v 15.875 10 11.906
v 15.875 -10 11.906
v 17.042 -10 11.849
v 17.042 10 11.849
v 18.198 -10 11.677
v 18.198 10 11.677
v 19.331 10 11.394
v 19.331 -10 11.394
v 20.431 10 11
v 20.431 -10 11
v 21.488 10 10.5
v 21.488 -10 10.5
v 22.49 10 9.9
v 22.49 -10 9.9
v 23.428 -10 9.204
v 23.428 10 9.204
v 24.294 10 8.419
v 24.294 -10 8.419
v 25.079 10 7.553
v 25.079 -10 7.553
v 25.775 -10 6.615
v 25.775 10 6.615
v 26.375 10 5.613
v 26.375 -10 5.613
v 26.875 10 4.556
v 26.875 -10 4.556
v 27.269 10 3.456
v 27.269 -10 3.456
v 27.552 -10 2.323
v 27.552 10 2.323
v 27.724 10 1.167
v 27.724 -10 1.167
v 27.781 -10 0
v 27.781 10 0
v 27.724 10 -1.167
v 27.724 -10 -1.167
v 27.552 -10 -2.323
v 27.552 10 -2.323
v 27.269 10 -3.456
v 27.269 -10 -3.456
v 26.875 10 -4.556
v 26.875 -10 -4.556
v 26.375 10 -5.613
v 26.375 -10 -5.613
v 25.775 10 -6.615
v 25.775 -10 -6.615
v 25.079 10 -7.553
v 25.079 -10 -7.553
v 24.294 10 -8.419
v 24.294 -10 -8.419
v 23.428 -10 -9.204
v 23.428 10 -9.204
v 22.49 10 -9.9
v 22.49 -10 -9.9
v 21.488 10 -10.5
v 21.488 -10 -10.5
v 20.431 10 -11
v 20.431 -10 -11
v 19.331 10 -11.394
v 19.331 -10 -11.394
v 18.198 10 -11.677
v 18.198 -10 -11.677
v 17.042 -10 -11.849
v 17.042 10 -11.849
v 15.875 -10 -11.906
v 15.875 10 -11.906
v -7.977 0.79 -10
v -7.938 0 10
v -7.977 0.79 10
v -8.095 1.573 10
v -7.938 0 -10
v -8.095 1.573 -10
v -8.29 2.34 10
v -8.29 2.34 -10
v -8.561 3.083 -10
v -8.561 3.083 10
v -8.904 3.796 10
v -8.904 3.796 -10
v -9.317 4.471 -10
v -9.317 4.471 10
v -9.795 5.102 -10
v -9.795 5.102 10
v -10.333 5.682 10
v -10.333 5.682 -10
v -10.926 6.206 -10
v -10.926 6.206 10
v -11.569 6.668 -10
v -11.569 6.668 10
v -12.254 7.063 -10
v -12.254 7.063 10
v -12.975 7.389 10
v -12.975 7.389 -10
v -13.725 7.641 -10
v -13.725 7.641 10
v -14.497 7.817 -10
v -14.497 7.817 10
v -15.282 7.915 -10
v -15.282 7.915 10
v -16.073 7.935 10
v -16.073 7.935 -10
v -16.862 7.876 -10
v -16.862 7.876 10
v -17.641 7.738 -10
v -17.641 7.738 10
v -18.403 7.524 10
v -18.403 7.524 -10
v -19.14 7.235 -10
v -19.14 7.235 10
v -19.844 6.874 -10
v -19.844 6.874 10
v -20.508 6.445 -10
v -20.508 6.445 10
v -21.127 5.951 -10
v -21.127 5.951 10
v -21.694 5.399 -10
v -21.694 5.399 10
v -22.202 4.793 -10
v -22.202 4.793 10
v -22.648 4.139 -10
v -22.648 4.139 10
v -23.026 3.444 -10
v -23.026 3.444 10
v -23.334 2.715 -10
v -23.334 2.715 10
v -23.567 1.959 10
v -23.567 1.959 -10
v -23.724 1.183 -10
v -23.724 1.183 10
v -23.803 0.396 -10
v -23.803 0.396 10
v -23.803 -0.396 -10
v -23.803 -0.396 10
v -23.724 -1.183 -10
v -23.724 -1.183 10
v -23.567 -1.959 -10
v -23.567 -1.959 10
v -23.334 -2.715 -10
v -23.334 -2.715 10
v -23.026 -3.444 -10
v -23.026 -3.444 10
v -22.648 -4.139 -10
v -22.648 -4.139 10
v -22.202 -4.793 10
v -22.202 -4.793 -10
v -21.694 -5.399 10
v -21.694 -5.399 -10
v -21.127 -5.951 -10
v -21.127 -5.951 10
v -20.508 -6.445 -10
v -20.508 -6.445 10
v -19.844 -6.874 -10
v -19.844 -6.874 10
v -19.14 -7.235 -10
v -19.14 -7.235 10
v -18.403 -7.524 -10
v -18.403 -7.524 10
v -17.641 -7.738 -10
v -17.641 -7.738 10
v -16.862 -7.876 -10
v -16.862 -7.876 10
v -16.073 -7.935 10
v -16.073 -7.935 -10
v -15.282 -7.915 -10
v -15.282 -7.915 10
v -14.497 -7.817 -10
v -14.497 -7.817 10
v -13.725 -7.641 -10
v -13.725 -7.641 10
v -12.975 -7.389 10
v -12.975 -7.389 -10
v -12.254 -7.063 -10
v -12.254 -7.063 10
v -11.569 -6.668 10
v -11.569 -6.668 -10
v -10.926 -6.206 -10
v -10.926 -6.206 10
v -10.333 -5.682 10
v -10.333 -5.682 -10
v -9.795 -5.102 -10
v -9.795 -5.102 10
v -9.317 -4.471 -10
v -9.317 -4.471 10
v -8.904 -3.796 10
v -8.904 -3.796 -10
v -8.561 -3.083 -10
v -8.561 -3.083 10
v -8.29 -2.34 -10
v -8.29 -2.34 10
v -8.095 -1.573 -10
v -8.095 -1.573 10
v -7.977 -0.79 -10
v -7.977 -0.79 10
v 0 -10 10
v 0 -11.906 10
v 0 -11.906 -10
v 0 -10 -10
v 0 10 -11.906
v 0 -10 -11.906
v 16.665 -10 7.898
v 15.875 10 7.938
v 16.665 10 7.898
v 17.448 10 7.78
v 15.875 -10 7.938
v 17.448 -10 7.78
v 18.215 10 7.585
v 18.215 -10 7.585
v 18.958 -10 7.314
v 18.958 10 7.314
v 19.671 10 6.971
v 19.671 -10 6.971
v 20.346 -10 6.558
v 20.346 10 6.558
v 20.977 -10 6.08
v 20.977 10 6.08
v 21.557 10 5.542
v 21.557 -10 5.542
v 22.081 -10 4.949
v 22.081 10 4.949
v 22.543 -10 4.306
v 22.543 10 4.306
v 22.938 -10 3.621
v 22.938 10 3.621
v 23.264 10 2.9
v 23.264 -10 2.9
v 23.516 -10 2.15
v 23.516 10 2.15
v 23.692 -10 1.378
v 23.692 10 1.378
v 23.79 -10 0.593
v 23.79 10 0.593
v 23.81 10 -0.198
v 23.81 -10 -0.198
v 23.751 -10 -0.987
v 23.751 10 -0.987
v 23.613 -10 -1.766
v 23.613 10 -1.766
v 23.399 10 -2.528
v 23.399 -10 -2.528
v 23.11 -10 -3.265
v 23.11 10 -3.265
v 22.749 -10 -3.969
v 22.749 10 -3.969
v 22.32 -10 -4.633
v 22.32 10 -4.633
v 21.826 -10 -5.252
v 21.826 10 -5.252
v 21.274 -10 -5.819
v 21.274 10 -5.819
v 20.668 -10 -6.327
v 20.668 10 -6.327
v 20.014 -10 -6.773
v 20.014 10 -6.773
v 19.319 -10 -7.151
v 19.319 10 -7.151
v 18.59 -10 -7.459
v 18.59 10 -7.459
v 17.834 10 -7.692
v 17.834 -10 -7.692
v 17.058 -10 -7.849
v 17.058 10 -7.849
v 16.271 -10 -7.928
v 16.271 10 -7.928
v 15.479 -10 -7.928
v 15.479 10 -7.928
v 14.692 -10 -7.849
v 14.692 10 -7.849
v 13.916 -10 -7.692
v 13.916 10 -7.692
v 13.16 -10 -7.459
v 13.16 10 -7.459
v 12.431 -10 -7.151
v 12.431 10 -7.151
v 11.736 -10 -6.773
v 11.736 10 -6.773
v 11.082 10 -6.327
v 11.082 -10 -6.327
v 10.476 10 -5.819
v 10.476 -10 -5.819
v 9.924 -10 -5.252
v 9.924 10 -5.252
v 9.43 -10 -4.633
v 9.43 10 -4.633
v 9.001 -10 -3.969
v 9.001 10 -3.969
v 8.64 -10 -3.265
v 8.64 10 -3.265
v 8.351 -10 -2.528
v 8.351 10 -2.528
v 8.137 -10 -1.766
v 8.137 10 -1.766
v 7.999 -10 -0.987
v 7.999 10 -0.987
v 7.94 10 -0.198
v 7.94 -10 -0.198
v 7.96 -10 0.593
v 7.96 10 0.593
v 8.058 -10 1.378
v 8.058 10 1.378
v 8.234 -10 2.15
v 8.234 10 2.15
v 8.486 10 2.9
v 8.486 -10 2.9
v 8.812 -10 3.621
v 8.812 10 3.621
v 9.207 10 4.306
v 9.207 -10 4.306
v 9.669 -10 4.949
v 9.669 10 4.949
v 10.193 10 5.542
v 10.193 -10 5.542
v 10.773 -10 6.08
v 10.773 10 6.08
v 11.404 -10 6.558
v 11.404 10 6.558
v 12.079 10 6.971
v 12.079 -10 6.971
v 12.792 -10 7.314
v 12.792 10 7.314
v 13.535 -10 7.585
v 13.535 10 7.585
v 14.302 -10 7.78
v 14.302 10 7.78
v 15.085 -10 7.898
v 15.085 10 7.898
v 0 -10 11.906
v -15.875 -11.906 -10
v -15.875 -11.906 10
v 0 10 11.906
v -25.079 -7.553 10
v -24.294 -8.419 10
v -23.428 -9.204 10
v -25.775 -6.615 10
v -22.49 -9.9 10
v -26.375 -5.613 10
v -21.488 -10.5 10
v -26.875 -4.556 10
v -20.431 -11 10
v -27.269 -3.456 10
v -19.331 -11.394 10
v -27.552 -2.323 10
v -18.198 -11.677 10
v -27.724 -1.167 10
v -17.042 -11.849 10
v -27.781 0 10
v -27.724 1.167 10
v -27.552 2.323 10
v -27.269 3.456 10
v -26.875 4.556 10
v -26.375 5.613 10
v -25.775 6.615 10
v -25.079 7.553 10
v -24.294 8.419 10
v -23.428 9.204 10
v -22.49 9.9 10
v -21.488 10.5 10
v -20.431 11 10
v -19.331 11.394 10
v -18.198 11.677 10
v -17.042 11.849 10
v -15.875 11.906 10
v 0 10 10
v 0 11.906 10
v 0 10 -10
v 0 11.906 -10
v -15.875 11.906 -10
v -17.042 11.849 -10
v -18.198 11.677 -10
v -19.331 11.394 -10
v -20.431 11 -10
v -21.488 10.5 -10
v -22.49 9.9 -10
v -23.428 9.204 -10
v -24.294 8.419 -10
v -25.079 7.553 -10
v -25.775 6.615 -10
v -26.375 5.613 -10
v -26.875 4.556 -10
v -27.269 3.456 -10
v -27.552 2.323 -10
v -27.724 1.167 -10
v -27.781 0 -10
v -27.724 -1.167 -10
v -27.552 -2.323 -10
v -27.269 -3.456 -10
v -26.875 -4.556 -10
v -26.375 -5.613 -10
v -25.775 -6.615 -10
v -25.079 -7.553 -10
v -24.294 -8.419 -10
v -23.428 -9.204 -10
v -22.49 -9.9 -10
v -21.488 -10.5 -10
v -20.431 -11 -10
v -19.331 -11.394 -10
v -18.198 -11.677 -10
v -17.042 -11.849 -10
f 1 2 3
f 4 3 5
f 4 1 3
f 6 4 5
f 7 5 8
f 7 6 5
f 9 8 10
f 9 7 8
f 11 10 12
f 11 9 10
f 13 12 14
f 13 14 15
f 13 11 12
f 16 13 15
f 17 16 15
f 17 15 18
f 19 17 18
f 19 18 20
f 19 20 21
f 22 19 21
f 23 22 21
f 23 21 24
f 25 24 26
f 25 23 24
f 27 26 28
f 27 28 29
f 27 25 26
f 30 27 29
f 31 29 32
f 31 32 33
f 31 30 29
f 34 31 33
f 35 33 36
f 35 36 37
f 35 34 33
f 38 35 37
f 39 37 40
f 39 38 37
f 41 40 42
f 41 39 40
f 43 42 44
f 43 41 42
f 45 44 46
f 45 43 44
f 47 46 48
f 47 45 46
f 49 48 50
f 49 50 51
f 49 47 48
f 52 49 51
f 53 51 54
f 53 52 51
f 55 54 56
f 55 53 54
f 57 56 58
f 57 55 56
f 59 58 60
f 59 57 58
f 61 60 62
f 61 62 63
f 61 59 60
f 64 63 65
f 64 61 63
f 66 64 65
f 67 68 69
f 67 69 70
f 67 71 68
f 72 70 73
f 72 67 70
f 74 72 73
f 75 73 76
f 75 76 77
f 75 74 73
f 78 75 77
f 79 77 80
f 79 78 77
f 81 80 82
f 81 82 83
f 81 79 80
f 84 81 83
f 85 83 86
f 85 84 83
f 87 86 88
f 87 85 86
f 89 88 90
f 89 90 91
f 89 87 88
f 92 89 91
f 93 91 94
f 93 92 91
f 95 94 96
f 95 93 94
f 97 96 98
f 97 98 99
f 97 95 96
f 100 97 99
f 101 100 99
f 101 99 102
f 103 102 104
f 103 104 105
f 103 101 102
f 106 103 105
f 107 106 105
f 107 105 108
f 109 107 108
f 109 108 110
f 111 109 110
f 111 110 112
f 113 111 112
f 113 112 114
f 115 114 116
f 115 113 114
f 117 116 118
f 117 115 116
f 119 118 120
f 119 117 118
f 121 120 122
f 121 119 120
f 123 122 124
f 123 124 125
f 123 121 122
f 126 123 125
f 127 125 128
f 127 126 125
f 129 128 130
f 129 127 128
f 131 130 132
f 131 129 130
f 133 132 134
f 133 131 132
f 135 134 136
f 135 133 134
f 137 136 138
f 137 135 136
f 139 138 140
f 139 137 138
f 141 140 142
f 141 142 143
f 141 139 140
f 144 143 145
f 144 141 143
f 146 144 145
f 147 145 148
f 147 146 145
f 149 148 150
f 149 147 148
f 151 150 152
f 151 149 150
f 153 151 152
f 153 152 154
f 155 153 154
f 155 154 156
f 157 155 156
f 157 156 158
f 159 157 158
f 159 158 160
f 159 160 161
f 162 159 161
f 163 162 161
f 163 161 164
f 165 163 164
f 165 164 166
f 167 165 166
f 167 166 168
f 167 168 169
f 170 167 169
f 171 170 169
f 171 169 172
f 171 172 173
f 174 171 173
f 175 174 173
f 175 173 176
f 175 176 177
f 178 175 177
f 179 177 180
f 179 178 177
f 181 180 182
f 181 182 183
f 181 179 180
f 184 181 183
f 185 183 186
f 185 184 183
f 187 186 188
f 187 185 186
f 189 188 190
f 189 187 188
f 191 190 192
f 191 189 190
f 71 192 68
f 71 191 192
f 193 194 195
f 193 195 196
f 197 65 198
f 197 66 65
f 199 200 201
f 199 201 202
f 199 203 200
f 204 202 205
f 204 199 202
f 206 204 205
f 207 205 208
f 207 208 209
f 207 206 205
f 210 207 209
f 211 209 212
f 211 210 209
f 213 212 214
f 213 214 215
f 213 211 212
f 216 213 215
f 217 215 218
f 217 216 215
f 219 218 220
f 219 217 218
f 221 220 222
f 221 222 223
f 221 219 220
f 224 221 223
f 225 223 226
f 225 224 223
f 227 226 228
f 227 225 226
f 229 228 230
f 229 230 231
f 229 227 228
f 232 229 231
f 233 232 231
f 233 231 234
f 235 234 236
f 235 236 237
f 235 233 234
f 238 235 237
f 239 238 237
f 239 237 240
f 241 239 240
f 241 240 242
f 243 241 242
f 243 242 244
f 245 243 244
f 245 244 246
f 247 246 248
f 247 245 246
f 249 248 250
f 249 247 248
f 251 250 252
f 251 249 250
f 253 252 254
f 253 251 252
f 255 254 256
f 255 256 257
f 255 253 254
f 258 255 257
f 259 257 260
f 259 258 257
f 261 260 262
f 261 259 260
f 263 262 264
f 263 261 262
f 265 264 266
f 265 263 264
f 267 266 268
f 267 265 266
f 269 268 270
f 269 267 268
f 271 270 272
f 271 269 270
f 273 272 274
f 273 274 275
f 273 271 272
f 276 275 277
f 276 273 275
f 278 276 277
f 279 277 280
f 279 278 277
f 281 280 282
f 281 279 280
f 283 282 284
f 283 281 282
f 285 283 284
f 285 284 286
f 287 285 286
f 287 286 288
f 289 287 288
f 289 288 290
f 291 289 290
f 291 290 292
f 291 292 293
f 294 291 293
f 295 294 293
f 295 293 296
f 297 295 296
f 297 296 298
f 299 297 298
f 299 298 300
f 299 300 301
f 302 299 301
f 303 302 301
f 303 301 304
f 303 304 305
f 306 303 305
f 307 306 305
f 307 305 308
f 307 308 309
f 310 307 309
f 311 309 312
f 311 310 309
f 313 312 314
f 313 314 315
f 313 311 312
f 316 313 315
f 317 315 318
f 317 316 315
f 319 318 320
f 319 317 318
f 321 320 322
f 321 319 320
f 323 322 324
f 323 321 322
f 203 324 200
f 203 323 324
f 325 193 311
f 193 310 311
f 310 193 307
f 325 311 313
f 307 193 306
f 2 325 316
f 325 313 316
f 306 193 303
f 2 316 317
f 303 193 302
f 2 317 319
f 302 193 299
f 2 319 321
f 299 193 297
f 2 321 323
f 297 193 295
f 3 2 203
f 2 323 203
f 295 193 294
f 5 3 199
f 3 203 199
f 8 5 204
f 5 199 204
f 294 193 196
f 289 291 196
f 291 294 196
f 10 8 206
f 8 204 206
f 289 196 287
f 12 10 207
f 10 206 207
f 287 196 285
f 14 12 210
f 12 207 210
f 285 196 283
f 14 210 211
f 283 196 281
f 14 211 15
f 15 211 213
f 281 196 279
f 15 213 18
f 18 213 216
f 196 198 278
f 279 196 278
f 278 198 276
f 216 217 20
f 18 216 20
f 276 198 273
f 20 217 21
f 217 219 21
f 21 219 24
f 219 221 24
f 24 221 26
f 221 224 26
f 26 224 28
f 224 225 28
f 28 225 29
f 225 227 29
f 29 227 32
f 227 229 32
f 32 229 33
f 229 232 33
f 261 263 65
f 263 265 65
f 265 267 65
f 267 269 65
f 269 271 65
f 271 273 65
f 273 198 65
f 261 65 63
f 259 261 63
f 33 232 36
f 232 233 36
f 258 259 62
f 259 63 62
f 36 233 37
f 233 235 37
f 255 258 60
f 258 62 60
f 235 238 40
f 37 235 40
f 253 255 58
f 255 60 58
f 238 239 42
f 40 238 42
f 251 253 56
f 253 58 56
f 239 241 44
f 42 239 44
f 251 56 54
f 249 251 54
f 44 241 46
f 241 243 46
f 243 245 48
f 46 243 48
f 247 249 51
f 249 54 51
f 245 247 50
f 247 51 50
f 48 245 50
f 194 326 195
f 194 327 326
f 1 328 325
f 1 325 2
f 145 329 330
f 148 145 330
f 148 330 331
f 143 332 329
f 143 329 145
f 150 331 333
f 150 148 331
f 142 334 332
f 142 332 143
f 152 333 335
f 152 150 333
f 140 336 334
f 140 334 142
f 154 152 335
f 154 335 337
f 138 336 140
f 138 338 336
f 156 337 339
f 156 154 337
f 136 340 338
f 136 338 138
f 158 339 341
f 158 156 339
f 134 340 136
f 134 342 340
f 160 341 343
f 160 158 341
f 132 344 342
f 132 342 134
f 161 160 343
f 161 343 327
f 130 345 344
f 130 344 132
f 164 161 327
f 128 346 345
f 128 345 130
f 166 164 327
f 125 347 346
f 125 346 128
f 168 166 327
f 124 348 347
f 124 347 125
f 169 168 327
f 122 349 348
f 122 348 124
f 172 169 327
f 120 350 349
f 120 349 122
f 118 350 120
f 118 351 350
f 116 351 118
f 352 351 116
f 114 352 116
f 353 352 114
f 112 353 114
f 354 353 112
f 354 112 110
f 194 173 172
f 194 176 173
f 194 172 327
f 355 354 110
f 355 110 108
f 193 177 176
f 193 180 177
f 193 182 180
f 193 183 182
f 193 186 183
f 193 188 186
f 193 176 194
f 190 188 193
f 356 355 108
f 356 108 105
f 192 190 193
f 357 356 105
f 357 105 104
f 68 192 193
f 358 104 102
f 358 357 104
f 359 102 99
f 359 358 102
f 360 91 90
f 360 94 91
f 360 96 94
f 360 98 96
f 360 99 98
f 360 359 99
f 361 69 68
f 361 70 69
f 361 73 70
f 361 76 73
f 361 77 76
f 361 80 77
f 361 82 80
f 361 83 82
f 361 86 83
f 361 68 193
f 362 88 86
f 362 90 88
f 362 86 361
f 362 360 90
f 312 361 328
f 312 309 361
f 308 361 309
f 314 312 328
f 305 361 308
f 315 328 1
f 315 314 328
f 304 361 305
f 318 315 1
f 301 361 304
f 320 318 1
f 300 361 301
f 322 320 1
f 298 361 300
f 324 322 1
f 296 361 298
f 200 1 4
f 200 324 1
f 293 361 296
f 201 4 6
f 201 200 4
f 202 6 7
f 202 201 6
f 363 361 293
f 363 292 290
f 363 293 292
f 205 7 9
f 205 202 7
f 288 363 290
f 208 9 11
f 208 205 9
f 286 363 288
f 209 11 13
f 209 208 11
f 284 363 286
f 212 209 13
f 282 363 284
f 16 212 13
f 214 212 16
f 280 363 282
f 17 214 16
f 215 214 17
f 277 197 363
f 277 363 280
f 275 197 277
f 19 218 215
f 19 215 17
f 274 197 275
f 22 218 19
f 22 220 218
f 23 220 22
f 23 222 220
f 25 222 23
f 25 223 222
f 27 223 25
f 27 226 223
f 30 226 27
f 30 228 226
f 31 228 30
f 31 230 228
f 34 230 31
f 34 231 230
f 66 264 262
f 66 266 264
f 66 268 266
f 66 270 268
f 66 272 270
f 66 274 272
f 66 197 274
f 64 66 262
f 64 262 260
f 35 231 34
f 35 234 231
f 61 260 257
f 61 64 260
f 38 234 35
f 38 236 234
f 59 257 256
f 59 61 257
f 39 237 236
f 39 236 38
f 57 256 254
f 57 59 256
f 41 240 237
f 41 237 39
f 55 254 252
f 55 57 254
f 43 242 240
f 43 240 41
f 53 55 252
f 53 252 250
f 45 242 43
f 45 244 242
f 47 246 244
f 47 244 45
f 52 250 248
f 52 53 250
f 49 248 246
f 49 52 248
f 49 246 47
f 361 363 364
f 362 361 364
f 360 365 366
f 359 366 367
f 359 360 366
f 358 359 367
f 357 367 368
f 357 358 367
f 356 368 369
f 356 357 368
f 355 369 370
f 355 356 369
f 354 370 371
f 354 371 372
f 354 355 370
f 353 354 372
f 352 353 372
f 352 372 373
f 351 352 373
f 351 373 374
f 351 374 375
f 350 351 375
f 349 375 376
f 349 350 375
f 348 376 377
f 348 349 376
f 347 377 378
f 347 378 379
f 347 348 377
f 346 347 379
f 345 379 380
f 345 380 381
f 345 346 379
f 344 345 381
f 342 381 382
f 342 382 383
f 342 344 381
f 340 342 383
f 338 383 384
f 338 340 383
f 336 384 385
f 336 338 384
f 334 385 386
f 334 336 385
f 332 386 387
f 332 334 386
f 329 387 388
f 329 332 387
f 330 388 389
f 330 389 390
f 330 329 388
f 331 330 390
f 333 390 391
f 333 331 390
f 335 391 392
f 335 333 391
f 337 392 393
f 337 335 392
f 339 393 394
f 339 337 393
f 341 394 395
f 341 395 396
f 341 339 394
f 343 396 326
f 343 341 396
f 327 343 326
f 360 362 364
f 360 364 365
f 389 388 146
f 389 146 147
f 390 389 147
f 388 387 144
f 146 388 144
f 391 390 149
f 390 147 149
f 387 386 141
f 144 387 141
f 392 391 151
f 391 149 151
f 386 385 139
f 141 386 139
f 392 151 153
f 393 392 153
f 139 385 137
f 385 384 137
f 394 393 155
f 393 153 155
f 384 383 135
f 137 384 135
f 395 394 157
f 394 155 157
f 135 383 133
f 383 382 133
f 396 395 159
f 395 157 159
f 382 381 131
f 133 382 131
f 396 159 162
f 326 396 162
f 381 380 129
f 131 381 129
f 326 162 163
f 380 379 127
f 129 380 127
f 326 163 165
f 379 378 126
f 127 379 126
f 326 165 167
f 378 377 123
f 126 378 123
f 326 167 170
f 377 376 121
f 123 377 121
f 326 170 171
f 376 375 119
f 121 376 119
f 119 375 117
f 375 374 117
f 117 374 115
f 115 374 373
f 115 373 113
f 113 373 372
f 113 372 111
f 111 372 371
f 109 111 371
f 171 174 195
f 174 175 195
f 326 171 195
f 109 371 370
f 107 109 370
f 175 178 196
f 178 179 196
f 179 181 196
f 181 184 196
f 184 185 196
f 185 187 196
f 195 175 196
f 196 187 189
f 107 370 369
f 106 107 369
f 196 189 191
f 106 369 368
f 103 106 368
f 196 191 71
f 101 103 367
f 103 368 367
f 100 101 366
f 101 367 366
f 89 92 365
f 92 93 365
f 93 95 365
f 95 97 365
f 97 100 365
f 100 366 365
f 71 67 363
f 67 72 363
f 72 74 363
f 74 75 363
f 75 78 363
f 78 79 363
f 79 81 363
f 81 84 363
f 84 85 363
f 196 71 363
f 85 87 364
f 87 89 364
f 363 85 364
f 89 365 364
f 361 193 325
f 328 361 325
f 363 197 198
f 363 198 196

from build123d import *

# Parameters (mm, degrees)
SKETCH3_R           = 7.9375
BOSS_EXTRUDE2_DEPTH = 10
SKETCH4_R           = 11.90625
SKETCH4_R_2         = 7.9375
BOSS_EXTRUDE3_DEPTH = 10


with BuildPart() as part:
    # Sketch3 → Boss-Extrude2 (new, symmetric)
    with BuildSketch(Plane.XY):
        with BuildLine():
            Line((0, -11.90625), (0, 11.90625))
            Line((0, 11.90625), (-15.875, 11.90625))
            ThreePointArc((-15.875, 11.90625), (-27.78125, 0), (-15.875, -11.90625))
            Line((-15.875, -11.90625), (0, -11.90625))
        make_face()
        with Locations((-15.875, 0)):
            Circle(SKETCH3_R, mode=Mode.SUBTRACT)
    extrude(amount=BOSS_EXTRUDE2_DEPTH, both=True)

    # Sketch4 → Boss-Extrude3 (add, symmetric)
    with BuildSketch(Plane(origin=(0, 0, 0), x_dir=(1, 0, 0), z_dir=(0, 1, 0))):
        with Locations((15.875, 0)):
            Circle(SKETCH4_R)
        with Locations(Location((15.875, 0, 0), (0, 0, 270))):
            Circle(SKETCH4_R_2, mode=Mode.SUBTRACT)
        with BuildLine():
            Line((0, -11.90625), (15.875, -11.90625))
            ThreePointArc((15.875, -11.90625), (3.96875, 0), (15.875, 11.90625))
            Line((15.875, 11.90625), (0, 11.90625))
            Line((0, 11.90625), (0, -11.90625))
        make_face()
    extrude(amount=BOSS_EXTRUDE3_DEPTH, both=True)


solid = part.part
